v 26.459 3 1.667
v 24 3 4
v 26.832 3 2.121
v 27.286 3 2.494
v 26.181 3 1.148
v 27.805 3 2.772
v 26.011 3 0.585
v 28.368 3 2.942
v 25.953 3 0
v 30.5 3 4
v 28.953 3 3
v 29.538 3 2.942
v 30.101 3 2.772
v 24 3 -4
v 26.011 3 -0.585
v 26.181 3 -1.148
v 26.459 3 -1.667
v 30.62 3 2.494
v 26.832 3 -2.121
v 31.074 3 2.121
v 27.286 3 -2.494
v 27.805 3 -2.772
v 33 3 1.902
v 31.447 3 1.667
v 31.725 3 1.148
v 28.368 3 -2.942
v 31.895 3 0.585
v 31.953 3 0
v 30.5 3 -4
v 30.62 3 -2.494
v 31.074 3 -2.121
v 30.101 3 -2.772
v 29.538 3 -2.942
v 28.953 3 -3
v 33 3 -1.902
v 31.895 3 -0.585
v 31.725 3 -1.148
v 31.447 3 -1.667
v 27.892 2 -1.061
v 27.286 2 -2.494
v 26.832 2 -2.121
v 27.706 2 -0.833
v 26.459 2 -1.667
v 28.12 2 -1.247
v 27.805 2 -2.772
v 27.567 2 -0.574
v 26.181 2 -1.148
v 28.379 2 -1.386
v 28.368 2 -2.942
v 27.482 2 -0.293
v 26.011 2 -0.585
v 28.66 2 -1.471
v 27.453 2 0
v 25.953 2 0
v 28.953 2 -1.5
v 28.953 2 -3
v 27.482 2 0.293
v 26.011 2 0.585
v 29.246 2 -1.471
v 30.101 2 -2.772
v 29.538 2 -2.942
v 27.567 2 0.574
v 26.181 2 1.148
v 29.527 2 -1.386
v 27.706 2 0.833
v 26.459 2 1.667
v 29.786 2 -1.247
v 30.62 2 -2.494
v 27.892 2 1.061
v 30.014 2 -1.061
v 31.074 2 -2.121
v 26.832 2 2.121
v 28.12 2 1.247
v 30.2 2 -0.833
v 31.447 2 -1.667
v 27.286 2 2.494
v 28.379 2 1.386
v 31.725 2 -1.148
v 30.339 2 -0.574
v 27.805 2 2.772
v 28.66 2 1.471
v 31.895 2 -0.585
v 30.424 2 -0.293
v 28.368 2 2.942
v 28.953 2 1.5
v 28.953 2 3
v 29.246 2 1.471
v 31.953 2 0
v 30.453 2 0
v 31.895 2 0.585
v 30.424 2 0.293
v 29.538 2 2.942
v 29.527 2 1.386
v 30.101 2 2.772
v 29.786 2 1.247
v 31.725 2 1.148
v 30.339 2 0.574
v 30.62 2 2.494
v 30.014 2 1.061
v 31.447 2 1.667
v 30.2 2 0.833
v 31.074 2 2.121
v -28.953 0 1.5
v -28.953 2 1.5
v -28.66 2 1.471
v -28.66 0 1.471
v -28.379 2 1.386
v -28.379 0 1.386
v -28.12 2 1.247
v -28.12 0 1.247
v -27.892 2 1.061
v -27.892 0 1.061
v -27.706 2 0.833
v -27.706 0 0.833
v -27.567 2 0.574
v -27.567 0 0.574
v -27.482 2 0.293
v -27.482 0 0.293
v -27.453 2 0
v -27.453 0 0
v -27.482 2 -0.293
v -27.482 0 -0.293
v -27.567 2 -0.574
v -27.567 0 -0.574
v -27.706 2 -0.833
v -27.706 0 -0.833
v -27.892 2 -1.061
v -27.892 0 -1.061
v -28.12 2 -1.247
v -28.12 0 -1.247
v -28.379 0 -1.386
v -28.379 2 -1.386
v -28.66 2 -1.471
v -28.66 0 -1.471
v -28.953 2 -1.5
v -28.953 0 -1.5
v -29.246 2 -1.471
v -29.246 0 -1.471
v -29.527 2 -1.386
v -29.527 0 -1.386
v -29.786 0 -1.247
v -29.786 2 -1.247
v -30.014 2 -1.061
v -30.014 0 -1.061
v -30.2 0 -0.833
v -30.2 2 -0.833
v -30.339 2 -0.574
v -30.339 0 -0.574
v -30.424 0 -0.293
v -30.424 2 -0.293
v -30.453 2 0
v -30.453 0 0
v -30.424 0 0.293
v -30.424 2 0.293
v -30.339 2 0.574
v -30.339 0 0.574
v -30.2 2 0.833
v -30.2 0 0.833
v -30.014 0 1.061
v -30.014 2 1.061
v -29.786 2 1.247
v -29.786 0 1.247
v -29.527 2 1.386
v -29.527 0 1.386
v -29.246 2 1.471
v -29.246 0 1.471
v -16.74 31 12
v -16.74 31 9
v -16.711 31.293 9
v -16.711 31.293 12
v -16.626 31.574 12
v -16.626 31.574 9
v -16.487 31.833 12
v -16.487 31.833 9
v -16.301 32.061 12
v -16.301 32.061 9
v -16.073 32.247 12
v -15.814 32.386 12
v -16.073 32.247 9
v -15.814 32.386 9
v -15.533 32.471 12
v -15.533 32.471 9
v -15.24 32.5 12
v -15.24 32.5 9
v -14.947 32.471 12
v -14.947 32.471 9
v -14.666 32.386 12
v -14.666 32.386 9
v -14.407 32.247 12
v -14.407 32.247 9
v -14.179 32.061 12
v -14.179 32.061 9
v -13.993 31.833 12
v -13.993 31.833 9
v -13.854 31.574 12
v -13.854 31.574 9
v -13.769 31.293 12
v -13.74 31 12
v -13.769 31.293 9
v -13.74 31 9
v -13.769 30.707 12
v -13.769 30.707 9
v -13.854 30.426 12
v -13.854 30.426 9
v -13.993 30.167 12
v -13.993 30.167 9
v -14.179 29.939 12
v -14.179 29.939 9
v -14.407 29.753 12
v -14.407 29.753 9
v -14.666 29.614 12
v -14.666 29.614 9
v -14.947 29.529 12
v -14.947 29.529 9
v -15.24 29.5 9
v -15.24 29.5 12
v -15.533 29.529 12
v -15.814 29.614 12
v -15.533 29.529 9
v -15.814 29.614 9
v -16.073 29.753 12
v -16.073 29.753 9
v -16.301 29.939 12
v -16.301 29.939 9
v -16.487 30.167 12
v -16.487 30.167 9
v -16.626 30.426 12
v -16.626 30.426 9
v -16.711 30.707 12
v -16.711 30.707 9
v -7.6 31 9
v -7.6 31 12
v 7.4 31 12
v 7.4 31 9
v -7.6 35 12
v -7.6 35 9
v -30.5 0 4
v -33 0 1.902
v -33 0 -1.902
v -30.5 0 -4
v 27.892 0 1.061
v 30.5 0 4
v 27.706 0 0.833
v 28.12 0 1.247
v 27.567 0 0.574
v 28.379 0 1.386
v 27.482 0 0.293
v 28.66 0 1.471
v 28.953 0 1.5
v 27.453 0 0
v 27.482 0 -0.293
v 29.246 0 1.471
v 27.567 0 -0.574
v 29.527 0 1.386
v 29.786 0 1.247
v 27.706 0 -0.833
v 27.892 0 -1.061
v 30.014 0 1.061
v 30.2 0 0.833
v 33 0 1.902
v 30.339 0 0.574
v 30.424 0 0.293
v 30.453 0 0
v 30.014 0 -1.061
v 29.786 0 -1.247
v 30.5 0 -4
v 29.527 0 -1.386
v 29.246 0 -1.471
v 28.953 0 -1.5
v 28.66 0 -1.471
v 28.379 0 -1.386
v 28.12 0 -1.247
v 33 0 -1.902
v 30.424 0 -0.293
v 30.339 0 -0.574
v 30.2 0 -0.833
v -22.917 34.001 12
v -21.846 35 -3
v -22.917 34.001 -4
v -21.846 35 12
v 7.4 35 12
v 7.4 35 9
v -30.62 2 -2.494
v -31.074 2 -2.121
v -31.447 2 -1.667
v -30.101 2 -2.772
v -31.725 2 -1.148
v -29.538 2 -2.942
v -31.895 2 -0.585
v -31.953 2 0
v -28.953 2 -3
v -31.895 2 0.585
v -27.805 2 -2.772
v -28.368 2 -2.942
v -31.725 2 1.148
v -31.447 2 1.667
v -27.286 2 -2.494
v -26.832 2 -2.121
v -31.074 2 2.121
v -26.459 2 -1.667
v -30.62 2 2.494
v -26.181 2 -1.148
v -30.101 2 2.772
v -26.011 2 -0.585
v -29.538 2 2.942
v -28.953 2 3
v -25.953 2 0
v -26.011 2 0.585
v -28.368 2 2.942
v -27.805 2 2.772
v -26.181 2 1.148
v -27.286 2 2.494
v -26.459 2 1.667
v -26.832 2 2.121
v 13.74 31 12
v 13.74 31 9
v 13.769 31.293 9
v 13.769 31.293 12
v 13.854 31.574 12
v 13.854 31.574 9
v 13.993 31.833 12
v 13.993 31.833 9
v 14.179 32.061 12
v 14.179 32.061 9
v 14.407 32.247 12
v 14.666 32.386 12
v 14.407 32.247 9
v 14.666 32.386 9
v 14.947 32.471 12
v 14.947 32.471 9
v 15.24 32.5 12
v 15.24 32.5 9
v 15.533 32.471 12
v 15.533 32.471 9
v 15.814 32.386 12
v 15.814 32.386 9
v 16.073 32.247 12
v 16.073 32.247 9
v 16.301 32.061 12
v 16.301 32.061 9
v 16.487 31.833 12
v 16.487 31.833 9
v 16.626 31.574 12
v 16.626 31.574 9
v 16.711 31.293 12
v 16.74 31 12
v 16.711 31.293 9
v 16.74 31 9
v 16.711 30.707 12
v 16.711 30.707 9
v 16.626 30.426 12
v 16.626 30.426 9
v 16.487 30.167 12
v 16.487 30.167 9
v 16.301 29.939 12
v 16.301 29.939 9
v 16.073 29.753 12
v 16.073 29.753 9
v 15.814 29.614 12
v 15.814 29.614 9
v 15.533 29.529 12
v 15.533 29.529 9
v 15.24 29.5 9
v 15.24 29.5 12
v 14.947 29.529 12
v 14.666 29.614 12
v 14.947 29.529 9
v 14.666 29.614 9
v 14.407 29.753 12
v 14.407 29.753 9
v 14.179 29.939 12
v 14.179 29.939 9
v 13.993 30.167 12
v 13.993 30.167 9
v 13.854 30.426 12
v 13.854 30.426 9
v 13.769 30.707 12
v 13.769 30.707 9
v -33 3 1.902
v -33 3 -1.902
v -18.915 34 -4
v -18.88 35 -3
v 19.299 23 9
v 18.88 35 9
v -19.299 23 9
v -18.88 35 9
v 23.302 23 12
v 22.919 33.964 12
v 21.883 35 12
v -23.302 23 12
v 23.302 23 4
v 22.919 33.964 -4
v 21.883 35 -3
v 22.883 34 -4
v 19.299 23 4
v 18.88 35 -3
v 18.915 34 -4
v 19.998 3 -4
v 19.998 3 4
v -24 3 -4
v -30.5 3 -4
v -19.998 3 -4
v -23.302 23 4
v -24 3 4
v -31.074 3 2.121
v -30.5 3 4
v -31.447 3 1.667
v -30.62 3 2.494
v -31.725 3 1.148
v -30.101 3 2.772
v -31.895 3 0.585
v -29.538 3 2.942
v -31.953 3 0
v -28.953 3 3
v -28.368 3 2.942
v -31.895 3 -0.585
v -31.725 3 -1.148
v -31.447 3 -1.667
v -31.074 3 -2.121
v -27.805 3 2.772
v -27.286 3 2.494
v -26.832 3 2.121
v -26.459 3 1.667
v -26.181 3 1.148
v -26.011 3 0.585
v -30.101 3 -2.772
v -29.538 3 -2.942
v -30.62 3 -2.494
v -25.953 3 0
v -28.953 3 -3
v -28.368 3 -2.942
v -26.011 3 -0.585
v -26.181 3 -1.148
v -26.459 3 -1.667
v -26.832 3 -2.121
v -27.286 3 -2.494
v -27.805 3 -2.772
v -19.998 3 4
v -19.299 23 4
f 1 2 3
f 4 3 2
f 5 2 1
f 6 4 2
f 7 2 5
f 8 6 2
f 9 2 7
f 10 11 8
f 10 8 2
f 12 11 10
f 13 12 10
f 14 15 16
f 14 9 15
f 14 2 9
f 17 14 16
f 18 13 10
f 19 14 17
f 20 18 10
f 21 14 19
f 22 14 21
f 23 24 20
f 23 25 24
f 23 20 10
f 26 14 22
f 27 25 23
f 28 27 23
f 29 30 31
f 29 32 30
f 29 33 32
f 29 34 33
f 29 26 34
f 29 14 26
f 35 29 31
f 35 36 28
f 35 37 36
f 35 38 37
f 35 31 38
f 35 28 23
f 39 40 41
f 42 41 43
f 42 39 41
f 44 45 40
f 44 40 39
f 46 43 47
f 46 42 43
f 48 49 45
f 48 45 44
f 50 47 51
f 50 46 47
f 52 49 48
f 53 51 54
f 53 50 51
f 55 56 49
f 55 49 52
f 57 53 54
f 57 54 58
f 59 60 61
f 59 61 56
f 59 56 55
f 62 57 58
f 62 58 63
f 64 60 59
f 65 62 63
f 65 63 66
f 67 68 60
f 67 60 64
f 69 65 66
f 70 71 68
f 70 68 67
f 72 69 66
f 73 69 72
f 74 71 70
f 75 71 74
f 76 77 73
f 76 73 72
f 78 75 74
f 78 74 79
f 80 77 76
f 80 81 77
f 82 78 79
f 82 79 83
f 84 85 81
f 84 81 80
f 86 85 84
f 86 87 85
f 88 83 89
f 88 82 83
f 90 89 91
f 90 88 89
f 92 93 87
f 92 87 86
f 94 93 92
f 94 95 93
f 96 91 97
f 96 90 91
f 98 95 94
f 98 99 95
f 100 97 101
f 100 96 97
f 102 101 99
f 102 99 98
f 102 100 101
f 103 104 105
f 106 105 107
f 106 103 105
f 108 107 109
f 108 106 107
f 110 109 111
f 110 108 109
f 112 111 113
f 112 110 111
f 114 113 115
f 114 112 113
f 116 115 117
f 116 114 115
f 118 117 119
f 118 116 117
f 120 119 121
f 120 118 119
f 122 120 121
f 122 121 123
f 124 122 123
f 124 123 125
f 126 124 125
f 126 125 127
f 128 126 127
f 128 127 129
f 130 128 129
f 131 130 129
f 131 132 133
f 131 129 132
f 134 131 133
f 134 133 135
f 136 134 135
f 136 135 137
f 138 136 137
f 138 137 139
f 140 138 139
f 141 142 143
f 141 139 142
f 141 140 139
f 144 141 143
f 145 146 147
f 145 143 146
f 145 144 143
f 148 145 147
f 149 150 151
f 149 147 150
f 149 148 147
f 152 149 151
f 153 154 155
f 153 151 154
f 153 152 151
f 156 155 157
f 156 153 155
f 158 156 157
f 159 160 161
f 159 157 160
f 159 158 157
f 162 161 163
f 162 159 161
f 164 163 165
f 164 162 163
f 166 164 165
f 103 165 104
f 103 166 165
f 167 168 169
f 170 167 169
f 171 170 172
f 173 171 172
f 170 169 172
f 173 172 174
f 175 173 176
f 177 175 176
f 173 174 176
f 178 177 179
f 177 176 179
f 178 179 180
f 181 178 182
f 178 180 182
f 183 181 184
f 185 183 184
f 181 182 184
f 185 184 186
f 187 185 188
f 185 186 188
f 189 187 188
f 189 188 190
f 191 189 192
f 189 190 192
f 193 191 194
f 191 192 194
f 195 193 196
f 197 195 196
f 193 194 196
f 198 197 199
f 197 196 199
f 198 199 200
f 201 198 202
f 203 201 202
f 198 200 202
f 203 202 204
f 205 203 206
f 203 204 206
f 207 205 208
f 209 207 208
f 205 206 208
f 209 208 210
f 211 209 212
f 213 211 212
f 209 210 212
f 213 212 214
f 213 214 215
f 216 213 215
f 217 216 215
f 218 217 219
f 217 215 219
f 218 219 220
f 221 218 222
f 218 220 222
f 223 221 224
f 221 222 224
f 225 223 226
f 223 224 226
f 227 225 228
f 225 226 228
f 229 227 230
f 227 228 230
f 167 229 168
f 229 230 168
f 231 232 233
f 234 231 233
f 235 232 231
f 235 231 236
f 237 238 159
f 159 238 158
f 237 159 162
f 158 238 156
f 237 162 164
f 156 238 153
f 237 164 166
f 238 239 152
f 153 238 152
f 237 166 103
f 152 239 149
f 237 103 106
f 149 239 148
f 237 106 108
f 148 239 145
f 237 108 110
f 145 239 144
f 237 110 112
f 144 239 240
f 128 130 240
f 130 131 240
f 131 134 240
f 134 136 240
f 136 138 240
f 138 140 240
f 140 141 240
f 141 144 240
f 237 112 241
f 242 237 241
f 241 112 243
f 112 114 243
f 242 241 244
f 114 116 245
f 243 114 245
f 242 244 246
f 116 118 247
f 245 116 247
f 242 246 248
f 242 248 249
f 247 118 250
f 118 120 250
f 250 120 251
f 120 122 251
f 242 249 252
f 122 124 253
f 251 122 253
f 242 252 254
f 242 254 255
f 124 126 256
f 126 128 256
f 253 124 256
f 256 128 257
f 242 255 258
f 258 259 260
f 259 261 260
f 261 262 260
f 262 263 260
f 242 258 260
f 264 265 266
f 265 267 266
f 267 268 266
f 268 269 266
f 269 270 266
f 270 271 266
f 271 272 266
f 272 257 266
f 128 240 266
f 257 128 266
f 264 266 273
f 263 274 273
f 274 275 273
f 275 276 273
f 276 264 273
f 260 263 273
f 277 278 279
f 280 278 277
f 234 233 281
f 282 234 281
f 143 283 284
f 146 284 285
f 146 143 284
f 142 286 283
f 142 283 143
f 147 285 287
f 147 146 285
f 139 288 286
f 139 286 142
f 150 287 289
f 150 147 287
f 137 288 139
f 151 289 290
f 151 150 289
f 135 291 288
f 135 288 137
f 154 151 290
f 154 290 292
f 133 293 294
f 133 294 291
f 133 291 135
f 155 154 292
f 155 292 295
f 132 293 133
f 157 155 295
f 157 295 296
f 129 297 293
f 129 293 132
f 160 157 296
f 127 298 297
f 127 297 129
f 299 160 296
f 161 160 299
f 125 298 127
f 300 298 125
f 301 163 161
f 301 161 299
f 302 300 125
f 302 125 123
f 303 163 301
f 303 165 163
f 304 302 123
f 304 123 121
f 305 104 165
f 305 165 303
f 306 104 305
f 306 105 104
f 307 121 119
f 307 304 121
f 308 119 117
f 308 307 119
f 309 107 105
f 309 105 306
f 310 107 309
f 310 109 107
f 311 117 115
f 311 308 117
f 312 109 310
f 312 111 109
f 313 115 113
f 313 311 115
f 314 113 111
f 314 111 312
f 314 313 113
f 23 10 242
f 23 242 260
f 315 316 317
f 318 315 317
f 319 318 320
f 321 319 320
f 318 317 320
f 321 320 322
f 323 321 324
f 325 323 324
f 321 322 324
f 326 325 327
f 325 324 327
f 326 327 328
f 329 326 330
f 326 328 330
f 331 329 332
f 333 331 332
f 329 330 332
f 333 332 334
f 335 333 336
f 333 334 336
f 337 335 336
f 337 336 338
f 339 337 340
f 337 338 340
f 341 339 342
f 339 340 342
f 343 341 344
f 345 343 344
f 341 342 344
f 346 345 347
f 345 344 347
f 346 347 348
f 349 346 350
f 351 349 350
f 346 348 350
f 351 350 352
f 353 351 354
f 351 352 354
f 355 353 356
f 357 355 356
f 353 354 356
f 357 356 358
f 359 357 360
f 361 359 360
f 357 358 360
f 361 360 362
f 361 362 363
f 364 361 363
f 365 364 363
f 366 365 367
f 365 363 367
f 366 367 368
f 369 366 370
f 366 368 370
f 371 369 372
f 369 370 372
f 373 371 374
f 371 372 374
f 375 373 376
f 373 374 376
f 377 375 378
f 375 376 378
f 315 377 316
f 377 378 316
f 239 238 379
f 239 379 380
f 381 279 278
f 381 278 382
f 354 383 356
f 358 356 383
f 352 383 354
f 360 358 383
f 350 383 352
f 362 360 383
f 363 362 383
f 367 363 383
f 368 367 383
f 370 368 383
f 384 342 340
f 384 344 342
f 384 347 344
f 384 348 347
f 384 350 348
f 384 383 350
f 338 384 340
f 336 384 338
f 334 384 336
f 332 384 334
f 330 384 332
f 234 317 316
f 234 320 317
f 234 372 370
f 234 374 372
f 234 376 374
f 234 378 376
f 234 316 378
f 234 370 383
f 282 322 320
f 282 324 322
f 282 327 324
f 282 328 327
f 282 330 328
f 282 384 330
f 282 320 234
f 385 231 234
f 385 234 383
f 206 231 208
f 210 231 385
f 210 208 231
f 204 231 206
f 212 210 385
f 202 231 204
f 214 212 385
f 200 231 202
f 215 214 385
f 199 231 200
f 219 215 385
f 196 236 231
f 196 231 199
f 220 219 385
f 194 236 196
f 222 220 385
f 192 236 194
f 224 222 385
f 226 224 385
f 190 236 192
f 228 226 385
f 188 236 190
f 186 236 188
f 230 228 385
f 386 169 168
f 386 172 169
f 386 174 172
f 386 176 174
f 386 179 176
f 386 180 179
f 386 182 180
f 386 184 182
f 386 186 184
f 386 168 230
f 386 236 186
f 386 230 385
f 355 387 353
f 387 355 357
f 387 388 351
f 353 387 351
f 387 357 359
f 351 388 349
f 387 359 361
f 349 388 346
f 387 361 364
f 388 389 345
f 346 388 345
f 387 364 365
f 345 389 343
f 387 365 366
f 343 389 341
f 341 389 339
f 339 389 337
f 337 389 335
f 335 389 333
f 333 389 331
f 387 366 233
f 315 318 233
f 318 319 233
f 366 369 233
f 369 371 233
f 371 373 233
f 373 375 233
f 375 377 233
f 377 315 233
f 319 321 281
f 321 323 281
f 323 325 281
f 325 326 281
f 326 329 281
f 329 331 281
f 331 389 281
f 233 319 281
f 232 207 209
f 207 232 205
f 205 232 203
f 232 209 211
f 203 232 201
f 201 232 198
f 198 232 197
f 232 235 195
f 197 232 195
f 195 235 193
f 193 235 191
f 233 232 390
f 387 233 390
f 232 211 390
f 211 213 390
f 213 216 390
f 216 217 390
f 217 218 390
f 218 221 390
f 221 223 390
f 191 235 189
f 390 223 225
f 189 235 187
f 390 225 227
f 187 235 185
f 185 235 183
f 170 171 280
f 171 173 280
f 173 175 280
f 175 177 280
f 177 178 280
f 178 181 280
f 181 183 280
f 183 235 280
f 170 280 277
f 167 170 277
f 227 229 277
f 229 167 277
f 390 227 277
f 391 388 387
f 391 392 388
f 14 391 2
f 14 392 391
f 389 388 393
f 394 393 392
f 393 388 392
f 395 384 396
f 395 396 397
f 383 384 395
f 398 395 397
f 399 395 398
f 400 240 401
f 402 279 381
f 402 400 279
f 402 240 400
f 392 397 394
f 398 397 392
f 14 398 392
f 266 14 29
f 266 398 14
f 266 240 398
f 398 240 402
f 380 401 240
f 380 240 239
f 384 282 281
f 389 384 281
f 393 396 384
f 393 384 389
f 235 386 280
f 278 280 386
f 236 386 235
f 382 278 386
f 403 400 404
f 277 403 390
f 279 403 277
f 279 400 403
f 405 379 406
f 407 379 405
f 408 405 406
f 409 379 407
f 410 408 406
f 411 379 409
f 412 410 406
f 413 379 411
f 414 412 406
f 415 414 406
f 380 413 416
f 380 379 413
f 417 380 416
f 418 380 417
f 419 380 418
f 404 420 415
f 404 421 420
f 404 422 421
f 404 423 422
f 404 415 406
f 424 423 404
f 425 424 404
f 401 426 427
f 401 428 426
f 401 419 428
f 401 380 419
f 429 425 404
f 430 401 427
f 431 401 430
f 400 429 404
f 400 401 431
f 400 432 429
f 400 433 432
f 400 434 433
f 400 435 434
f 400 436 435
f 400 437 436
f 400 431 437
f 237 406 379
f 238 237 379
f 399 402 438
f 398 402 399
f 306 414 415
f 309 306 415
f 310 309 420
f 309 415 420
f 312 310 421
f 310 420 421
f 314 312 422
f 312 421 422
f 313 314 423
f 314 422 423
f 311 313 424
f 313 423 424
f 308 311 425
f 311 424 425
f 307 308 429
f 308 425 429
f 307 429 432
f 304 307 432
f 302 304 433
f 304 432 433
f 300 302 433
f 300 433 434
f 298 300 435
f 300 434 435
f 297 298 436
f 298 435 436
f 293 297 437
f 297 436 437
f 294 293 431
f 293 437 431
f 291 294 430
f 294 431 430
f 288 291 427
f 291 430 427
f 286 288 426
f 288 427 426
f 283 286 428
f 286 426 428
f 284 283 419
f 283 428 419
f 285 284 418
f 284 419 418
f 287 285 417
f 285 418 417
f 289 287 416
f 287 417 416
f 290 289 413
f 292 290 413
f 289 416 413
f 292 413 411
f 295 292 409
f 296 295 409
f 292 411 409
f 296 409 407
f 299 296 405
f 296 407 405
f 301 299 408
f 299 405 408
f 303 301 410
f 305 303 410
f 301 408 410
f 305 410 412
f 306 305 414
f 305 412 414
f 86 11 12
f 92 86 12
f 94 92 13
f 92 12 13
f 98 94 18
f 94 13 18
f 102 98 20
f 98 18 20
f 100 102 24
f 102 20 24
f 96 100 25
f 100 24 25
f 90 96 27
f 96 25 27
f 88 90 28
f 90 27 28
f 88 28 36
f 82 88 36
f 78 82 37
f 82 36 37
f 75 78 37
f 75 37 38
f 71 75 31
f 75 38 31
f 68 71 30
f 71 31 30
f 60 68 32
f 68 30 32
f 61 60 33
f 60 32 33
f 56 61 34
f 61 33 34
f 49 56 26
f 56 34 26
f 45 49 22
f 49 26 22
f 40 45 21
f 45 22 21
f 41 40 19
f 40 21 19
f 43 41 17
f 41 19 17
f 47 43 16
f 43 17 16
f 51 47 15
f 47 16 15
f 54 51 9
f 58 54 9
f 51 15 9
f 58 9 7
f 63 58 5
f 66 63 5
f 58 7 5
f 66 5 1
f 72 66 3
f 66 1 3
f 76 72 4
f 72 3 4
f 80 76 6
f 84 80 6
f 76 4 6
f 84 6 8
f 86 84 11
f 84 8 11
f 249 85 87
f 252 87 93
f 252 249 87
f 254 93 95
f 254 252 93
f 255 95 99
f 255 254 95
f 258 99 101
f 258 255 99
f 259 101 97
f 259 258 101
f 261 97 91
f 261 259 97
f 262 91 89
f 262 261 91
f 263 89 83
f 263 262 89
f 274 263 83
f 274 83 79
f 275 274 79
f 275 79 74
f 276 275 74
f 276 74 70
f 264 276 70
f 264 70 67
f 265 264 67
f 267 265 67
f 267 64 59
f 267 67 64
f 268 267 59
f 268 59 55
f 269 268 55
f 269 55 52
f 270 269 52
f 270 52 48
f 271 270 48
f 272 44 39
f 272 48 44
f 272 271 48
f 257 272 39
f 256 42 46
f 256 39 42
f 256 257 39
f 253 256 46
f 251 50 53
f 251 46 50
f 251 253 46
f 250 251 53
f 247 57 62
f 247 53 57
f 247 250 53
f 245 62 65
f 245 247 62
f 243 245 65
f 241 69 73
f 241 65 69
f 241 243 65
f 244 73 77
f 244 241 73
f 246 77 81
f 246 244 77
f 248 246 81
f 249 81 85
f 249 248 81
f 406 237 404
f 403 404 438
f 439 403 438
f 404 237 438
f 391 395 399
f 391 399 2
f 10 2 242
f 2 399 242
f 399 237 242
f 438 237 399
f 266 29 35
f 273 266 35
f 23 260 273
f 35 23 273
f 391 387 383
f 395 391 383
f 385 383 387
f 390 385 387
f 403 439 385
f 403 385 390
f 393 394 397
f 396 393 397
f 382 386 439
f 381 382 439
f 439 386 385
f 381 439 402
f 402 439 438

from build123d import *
from OCP.BRepFilletAPI import BRepFilletAPI_MakeChamfer

# Parameters (mm, degrees)
SKETCH1_W           = 66
SKETCH1_H           = 8
SKETCH1_R           = 1.5
BOSS_EXTRUDE1_DEPTH = 3
BOSS_EXTRUDE4_DEPTH = 8
BOSS_EXTRUDE6_DEPTH = 8
SKETCH7_R           = 3
CUT_EXTRUDE1_DEPTH  = 1
SKETCH8_W           = 15
SKETCH8_H           = 4
CUT_EXTRUDE2_DEPTH  = 8
CUT_EXTRUDE3_DEPTH  = 5
CHAMFER2_SIZE       = 1
CHAMFER2_SIZE2      = 1.036815955
SKETCH10_R          = 1.5
CUT_EXTRUDE4_DEPTH  = 3
CUT_EXTRUDE5_DEPTH  = 3


with BuildPart() as part:
    # Sketch1 → Boss-Extrude1 (new body)
    with BuildSketch(Plane(origin=(0, 0, 0), x_dir=(1, 0, 0), z_dir=(0, 1, 0))):
        Rectangle(SKETCH1_W, SKETCH1_H)
        with Locations(Location((-28.953010595, 0, 0), (0, 0, 270))):
            Circle(SKETCH1_R, mode=Mode.SUBTRACT)
        with Locations(Location((28.953010595, 0, 0), (0, 0, 270))):
            Circle(SKETCH1_R, mode=Mode.SUBTRACT)
    extrude(amount=BOSS_EXTRUDE1_DEPTH)

    # Sketch4 → Boss-Extrude4 (add)
    with BuildSketch(Plane.XY.offset(4)):
        Polygon((-24, 3), (-22.882535376, 35), (-18.880097199, 35), (-19.997561823, 3), align=None)
    boss_extrude4 = extrude(amount=-BOSS_EXTRUDE4_DEPTH)

    # Mirror1: Boss-Extrude4 across plane
    add(boss_extrude4.mirror(Plane(origin=(0, 0, 0), x_dir=(0, 0, 1), z_dir=(1, 0, 0))))

    # Sketch6 → Boss-Extrude6 (add)
    with BuildSketch(Plane.XY.offset(4)):
        Polygon((-22.882535376, 35), (22.882535376, 35), (23.30158461, 23), (-23.30158461, 23), align=None)
    extrude(amount=BOSS_EXTRUDE6_DEPTH)

    # Sketch7 → Cut-Extrude1 (cut)
    with BuildSketch(Plane(origin=(0, 3, 0), x_dir=(1, 0, 0), z_dir=(0, 1, 0))):
        with Locations(Location((-28.953010595, 0, 0), (0, 0, 270))):
            Circle(SKETCH7_R)
        with Locations(Location((28.953010595, 0, 0), (0, 0, 270))):
            Circle(SKETCH7_R)
    extrude(amount=-CUT_EXTRUDE1_DEPTH, mode=Mode.SUBTRACT)

    # Sketch8 → Cut-Extrude2 (cut)
    with BuildSketch(Plane.XY.offset(12)):
        with Locations((-0.1, 33)):
            Rectangle(SKETCH8_W, SKETCH8_H)
    extrude(amount=-CUT_EXTRUDE2_DEPTH, mode=Mode.SUBTRACT)

    # Sketch9 → Cut-Extrude3 (cut)
    with BuildSketch(Plane(origin=(0, 0, 4), x_dir=(-1, 0, 0), z_dir=(0, 0, -1))):
        Polygon((-19.299146433, 23), (19.299146433, 23), (18.880097199, 35), (-18.880097199, 35), align=None)
    extrude(amount=-CUT_EXTRUDE3_DEPTH, mode=Mode.SUBTRACT)

    # Chamfer2: one chamfer whose edges measure the first distance from different faces: ONE call of the kernel's chamfer builder (chamfer() names one face for all edges)
    chamfer2_edges_1 = [part.edges().sort_by_distance(p)[0] for p in [
        (-22.882535376, 35, 4),
    ]]
    chamfer2_side_1 = [part.faces().sort_by_distance(p)[0] for p in [
        (-23.346029226, 21.727272727, 2.181818182),
    ]]
    chamfer2_edges_2 = [part.edges().sort_by_distance(p)[0] for p in [
        (-20.881316288, 35, -4),
        (20.881316288, 35, -4),
    ]]
    chamfer2_edges_3 = [part.edges().sort_by_distance(p)[0] for p in [
        (22.882535376, 35, 4),
    ]]
    chamfer2_side_3 = [part.faces().sort_by_distance(p)[0] for p in [
        (22.659890165, 35, 4),
    ]]
    chamfer2 = BRepFilletAPI_MakeChamfer(part.part.solid().wrapped)
    for e in chamfer2_edges_1:
        chamfer2.Add(CHAMFER2_SIZE, CHAMFER2_SIZE2, e.wrapped, chamfer2_side_1[0].wrapped)  # the first distance lies on this face
    for e in chamfer2_edges_2:
        chamfer2.Add(CHAMFER2_SIZE, e.wrapped)
    for e in chamfer2_edges_3:
        chamfer2.Add(CHAMFER2_SIZE, CHAMFER2_SIZE2, e.wrapped, chamfer2_side_3[0].wrapped)  # the first distance lies on this face
    add(Compound.cast(chamfer2.Shape()), mode=Mode.REPLACE)

    # Sketch10 → Cut-Extrude4 (cut)
    with BuildSketch(Plane(origin=(0, 0, 9), x_dir=(-1, 0, 0), z_dir=(0, 0, -1))):
        with Locations((-15.24, 31)):
            Circle(SKETCH10_R)
        with Locations((15.24, 31)):
            Circle(SKETCH10_R)
    extrude(amount=-CUT_EXTRUDE4_DEPTH, mode=Mode.SUBTRACT)

    # Sketch13 → Cut-Extrude5 (cut)
    with BuildSketch(Plane(origin=(0, 3, 0), x_dir=(1, 0, 0), z_dir=(0, 1, 0))):
        Polygon((-30.5, 4), (-33, 1.902250922), (-33, 4), align=None)
        Polygon((-30.5, -4), (-33, -1.902250922), (-33, -4), align=None)
        Polygon((30.5, -4), (33, -1.902250922), (33, -4), align=None)
        Polygon((30.5, 4), (33, 1.902250922), (33, 4), align=None)
    extrude(amount=-CUT_EXTRUDE5_DEPTH, mode=Mode.SUBTRACT)


solid = part.part
